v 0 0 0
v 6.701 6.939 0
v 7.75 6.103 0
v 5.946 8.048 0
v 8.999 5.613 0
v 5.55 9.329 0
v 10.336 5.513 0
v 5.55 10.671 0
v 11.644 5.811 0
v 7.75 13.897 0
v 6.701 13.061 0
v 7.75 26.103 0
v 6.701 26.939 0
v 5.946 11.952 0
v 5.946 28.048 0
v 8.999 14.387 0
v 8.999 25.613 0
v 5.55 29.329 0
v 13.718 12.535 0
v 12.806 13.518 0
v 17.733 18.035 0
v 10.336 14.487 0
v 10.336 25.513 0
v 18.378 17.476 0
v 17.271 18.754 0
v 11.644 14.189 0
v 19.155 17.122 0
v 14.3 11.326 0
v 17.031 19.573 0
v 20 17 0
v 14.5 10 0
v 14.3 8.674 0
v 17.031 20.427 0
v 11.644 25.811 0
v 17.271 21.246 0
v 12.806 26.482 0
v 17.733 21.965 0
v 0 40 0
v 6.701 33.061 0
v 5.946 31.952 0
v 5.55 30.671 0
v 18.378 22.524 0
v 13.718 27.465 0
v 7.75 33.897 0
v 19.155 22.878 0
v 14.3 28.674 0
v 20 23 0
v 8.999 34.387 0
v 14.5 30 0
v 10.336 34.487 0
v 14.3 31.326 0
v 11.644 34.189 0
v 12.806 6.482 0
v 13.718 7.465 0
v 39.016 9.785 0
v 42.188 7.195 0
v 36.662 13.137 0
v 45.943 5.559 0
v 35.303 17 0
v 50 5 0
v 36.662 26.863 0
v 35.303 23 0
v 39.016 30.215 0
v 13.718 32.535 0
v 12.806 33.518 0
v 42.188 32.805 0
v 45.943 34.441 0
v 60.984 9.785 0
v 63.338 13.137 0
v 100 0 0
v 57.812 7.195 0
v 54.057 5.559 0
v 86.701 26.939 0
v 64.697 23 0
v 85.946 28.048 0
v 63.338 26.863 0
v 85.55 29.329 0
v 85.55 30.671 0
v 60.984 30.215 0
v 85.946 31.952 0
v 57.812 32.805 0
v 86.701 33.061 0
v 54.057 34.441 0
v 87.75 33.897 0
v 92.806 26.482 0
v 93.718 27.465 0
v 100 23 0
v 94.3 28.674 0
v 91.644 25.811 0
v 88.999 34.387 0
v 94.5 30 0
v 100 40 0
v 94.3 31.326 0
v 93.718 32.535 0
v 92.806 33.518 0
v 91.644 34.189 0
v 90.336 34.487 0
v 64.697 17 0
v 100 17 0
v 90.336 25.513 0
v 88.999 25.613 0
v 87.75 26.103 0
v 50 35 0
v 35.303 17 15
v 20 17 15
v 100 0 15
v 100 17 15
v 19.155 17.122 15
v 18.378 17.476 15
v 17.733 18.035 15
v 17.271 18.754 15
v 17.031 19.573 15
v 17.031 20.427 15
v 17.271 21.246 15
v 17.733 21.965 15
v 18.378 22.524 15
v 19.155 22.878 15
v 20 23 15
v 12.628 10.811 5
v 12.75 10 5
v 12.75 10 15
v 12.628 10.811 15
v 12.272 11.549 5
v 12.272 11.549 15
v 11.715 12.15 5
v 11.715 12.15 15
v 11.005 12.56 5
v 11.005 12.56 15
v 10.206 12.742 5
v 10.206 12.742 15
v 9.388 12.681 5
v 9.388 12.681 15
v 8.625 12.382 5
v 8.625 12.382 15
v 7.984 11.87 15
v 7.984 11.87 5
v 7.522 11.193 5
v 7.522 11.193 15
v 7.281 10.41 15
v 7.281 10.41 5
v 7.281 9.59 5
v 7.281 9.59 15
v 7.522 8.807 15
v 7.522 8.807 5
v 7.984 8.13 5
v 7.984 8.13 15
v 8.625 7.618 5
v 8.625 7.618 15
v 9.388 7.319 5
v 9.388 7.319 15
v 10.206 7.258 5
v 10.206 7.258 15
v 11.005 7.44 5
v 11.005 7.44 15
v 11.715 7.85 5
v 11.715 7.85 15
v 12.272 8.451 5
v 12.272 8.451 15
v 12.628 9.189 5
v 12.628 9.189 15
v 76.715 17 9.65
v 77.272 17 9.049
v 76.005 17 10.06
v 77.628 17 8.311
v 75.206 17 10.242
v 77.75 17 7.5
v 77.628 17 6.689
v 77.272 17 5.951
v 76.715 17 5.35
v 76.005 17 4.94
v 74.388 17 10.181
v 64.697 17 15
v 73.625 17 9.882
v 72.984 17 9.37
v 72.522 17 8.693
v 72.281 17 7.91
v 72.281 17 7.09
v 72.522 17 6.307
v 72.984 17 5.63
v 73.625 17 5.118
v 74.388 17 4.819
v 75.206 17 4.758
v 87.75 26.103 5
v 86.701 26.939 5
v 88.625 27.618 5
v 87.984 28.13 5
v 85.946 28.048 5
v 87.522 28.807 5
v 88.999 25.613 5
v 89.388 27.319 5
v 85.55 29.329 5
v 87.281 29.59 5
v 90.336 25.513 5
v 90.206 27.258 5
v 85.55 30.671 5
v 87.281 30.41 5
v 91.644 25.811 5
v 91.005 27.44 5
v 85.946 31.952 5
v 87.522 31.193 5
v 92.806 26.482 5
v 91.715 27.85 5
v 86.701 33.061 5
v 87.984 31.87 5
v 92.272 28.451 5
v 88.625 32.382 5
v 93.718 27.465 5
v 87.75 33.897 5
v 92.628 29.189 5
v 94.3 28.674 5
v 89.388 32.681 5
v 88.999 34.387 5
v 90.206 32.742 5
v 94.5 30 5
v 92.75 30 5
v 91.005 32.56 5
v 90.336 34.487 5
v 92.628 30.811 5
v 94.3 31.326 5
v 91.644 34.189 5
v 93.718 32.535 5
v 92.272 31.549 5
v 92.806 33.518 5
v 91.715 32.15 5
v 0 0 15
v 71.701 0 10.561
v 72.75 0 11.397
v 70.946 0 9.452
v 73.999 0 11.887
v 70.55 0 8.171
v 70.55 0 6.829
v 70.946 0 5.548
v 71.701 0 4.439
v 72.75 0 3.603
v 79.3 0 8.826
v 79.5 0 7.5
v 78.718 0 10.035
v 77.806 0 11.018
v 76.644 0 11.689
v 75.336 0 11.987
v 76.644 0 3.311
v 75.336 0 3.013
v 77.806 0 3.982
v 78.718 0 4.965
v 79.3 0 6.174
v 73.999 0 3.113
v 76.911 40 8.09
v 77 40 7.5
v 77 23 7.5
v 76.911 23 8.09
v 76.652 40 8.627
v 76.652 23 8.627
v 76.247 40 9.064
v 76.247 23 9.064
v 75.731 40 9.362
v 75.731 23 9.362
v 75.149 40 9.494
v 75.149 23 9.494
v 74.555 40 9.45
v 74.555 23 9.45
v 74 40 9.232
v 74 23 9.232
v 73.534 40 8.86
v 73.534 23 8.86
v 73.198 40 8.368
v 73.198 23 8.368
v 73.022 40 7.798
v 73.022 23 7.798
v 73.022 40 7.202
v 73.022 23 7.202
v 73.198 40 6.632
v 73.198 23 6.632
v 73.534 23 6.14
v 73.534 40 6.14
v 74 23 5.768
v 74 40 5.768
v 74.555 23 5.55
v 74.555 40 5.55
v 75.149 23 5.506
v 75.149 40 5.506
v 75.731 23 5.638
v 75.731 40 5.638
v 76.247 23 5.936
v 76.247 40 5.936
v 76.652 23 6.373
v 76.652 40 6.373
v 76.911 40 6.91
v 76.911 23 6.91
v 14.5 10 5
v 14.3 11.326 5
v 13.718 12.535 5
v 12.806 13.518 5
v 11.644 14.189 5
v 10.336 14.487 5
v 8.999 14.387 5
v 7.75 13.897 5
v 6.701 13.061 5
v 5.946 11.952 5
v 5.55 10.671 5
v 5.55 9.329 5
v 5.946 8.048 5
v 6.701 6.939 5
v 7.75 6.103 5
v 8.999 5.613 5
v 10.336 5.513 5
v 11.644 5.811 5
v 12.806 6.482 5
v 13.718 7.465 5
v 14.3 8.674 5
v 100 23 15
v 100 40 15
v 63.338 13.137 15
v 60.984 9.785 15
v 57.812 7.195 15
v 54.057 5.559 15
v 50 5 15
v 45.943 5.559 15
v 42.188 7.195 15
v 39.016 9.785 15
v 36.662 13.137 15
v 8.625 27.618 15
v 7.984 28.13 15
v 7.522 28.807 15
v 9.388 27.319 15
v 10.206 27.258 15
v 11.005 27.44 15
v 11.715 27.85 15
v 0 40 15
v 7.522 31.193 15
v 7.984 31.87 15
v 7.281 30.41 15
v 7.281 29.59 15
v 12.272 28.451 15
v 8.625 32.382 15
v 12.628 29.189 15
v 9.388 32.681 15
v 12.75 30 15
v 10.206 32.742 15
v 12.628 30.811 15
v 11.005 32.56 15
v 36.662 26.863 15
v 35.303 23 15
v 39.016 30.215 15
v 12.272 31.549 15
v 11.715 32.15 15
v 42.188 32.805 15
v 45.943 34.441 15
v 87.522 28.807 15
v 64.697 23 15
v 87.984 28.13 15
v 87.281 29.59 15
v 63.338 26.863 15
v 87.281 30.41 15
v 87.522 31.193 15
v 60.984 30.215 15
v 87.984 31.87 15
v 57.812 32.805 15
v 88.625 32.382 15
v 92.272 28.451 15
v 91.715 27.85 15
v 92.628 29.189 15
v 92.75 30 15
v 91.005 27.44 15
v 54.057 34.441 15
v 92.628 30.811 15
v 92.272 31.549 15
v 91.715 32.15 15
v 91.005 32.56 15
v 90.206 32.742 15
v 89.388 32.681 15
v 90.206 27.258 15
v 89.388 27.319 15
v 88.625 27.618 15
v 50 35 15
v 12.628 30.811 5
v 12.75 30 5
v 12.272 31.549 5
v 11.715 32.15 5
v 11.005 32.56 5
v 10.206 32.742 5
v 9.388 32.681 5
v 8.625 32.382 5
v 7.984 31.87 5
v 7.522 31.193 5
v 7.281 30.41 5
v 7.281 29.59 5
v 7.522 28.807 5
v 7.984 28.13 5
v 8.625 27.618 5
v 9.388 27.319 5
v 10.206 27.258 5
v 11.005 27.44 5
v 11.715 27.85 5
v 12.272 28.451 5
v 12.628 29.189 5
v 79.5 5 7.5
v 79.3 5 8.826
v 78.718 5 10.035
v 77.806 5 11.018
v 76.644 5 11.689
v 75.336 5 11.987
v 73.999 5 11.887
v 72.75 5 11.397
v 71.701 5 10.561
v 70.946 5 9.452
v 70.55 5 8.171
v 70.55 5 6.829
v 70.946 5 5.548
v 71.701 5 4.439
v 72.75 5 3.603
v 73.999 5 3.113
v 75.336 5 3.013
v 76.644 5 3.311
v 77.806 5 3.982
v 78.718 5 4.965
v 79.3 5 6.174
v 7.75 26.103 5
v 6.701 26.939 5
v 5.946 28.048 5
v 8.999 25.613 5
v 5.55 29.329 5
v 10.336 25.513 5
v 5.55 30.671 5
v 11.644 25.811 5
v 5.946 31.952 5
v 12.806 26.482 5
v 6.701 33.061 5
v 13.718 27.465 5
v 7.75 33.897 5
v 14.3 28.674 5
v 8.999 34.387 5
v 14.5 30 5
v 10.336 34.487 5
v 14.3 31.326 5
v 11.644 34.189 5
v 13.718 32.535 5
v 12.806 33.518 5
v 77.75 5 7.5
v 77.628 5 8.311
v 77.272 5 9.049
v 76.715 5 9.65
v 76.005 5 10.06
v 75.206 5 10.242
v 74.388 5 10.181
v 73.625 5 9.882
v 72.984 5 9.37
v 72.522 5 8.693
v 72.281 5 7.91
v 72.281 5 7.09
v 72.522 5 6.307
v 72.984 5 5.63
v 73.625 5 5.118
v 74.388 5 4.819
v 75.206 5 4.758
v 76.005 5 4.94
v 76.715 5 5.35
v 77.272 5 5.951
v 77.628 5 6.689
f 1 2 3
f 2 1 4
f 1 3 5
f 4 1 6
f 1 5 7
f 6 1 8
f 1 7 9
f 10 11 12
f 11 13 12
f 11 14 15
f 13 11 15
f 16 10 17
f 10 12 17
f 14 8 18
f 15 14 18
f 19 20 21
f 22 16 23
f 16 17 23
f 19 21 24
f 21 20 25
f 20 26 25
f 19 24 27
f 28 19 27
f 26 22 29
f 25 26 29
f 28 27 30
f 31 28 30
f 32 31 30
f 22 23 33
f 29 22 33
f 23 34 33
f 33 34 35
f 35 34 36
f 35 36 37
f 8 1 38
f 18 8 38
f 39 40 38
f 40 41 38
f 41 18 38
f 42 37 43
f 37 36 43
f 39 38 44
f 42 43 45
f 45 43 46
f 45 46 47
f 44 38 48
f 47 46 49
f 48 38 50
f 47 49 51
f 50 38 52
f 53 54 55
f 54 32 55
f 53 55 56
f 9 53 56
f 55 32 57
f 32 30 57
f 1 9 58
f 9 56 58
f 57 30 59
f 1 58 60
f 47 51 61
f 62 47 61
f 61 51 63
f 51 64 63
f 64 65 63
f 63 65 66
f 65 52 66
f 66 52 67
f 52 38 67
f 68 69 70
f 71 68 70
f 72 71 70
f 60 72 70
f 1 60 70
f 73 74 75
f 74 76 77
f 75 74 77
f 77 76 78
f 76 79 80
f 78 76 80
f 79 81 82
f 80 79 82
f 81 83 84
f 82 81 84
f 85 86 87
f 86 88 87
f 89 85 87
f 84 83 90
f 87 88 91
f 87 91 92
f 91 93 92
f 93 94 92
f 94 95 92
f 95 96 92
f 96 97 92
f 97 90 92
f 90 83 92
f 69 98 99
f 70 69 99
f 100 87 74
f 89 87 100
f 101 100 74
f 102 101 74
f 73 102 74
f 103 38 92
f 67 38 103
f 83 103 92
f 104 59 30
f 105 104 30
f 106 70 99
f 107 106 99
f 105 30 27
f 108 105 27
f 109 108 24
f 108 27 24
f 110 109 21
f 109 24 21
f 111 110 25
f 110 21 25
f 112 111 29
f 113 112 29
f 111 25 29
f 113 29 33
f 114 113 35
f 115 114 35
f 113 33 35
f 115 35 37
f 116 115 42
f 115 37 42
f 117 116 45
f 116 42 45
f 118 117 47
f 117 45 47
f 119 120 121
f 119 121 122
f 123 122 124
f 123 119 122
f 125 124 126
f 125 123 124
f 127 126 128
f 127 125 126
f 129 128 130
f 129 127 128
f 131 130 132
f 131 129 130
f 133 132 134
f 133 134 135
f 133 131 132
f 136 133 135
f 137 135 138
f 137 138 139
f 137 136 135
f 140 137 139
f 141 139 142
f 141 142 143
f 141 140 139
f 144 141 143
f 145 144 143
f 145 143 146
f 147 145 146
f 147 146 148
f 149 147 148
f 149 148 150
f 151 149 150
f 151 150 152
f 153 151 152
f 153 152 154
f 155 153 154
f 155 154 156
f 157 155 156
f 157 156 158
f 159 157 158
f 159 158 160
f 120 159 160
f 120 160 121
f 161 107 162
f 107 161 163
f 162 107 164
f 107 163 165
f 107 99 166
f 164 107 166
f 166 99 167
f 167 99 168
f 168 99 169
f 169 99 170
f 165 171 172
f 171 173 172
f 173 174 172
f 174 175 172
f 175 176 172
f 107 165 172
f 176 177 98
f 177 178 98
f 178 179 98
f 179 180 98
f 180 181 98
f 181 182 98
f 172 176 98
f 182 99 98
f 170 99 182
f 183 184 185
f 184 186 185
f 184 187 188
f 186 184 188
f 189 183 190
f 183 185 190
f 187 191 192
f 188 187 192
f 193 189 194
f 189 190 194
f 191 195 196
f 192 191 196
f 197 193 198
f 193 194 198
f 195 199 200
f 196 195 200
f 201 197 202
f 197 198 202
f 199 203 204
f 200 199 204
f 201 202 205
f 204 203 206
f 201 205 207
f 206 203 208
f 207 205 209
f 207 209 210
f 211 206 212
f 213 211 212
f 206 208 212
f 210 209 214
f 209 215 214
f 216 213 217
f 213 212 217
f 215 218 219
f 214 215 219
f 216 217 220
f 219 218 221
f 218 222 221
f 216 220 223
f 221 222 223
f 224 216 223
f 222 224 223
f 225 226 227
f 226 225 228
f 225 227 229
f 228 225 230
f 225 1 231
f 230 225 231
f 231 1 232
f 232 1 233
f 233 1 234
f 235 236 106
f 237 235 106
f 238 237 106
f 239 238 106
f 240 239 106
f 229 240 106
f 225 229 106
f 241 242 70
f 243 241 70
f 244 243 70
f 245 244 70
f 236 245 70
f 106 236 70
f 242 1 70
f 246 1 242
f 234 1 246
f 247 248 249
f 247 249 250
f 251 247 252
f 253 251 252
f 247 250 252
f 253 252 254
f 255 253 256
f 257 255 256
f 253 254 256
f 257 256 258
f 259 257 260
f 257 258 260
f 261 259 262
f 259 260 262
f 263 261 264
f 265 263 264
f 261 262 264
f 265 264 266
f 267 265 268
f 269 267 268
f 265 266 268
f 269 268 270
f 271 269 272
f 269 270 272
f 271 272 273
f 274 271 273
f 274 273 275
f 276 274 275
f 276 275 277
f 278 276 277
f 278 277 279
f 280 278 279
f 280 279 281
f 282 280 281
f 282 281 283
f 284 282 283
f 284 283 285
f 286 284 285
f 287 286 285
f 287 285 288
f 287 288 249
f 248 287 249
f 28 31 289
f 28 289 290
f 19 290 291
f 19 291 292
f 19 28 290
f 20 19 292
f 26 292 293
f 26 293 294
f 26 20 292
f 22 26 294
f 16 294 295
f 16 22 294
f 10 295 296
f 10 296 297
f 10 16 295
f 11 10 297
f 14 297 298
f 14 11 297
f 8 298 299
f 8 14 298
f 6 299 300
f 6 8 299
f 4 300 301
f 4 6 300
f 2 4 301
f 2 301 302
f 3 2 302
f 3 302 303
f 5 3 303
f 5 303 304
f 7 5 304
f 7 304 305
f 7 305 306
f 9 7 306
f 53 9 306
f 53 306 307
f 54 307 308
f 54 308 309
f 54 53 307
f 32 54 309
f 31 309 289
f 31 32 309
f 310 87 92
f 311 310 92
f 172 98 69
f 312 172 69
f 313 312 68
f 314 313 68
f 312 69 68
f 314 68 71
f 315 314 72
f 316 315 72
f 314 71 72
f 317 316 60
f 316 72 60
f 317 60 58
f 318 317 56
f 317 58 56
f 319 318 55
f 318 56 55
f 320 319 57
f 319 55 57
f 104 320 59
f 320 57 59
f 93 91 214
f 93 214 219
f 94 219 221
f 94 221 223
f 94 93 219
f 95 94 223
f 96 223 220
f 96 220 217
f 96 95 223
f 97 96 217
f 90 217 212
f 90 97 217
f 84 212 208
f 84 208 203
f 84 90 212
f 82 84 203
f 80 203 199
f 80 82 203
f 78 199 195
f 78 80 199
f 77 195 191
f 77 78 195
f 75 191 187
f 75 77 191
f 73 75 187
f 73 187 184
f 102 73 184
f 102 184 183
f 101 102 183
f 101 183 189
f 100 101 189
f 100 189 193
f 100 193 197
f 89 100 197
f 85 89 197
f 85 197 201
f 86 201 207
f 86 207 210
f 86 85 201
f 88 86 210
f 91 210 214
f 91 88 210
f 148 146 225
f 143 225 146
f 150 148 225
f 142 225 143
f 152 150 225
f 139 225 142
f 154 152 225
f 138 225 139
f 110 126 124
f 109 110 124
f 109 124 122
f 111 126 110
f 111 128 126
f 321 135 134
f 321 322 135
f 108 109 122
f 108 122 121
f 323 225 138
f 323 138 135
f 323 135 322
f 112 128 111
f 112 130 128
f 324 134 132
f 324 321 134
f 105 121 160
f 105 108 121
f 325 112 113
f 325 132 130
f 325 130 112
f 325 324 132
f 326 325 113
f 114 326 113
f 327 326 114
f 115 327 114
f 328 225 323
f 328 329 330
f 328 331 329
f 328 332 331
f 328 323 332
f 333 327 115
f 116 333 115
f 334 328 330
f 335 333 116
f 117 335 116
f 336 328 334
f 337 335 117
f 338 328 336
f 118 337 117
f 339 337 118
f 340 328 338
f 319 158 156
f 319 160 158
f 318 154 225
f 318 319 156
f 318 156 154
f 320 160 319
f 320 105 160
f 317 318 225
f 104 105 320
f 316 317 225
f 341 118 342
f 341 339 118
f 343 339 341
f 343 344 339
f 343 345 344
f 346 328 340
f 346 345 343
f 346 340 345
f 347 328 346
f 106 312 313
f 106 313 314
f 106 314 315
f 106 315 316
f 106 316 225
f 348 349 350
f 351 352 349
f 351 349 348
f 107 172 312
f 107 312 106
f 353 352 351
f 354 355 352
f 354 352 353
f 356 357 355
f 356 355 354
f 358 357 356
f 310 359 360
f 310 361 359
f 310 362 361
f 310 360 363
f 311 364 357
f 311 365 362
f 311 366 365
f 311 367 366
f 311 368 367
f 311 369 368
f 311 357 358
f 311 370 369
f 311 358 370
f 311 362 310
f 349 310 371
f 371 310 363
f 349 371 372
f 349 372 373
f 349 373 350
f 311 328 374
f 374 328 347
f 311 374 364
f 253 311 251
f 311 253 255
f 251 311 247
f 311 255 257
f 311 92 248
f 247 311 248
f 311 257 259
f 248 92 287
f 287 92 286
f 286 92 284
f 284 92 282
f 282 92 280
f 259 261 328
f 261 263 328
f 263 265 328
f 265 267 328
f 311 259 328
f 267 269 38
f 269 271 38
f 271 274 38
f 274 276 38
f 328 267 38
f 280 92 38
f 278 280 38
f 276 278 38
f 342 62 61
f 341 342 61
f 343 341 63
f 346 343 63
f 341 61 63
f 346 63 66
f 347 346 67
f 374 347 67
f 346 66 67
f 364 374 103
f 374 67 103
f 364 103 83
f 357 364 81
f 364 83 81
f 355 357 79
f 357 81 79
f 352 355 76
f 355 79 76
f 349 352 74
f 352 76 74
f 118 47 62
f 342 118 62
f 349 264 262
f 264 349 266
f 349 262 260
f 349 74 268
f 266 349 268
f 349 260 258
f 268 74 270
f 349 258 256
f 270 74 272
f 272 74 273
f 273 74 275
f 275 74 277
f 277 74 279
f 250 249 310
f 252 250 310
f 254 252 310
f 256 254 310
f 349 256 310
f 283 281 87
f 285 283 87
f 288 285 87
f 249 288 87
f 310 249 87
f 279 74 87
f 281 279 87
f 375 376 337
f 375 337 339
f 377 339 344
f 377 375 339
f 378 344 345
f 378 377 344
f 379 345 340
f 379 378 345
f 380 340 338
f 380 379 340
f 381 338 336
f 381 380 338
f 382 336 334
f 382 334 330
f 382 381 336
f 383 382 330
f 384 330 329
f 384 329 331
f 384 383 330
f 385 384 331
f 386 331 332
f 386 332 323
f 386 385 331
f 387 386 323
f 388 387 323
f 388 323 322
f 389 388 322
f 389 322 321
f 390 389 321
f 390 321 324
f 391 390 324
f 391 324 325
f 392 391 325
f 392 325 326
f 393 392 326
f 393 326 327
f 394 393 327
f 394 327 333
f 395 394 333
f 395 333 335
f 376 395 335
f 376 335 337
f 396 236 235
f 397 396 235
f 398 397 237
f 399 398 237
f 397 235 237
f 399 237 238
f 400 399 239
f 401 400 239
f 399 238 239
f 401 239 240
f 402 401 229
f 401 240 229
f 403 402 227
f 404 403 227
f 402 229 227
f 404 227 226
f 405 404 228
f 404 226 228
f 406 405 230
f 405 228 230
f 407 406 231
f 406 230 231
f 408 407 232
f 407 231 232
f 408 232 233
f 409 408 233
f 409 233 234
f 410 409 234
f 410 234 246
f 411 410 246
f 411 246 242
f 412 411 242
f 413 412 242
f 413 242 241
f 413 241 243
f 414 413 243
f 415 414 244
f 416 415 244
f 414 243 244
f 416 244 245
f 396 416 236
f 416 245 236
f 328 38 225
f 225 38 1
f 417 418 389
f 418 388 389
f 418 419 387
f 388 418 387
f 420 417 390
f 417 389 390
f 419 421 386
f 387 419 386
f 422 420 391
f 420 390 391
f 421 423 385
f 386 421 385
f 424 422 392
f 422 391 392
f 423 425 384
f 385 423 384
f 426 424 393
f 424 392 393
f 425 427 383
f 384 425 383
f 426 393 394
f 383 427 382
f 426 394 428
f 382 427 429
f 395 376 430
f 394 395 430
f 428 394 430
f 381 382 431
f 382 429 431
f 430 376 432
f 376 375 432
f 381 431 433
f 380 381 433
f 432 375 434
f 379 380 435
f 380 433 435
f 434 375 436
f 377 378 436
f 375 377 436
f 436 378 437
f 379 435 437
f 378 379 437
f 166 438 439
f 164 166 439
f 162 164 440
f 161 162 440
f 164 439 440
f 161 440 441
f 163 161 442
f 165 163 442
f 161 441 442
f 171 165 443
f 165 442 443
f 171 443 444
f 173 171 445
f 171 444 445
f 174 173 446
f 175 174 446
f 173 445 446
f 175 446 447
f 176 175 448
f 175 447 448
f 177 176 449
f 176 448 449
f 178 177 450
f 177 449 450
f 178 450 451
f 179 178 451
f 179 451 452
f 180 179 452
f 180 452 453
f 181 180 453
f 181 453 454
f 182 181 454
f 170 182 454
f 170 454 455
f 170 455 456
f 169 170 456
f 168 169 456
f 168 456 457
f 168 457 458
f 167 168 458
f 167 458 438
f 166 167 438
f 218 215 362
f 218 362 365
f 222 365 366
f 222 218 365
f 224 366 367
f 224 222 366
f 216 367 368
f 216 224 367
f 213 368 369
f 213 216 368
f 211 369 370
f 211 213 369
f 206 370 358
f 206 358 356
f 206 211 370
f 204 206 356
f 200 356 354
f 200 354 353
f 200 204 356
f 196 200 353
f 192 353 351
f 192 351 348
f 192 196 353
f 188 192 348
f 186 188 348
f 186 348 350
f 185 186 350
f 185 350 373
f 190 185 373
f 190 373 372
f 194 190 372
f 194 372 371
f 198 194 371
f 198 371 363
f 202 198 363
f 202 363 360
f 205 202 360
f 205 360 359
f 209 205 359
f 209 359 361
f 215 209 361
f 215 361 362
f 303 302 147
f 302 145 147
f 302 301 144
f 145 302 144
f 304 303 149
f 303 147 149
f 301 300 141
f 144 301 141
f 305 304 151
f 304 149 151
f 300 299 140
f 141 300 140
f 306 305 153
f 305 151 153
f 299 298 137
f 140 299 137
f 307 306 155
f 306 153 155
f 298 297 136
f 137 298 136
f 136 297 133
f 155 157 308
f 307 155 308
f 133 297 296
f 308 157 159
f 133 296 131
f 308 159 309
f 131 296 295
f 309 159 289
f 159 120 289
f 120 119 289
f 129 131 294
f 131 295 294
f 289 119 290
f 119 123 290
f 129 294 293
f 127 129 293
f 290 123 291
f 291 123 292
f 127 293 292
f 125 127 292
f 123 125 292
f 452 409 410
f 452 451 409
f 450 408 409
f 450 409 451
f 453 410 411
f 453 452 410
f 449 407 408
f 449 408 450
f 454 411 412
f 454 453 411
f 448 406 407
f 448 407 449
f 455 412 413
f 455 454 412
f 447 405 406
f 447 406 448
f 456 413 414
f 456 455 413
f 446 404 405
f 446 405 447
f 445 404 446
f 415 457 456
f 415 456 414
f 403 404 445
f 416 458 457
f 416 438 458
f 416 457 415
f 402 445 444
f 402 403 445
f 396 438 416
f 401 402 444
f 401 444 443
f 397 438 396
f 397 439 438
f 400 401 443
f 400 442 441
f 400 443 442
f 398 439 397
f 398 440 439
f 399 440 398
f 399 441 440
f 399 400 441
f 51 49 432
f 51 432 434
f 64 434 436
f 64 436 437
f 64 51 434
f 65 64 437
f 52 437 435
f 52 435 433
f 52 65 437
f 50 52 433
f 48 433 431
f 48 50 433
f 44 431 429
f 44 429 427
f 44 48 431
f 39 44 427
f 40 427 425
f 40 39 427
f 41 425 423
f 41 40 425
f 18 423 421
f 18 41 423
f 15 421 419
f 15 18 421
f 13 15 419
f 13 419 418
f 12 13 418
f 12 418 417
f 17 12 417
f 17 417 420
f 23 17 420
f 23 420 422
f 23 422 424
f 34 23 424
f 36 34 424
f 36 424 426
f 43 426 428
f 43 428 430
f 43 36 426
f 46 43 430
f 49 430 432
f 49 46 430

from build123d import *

# Parameters (mm, degrees)
SKETCH1_R           = 2.75
BOSS_EXTRUDE1_DEPTH = 15
SKETCH2_R           = 2
CUT_EXTRUDE1_DEPTH  = 41
SKETCH3_R           = 4.5
CUT_EXTRUDE2_DEPTH  = 5
SKETCH4_R           = 4.5
CUT_EXTRUDE3_DEPTH  = 5
CUT_EXTRUDE4_REACH  = 37
SKETCH5_R           = 2.75


with BuildPart() as part:
    # Sketch1 → Boss-Extrude1 (new body)
    with BuildSketch(Plane.XY):
        with BuildLine():
            Line((0, 0), (100, 0))
            Line((100, 0), (100, 17))
            Line((100, 17), (64.696938457, 17))
            ThreePointArc((64.696938457, 17), (50, 5), (35.303061543, 17))
            Line((35.303061543, 17), (20, 17))
            ThreePointArc((20, 17), (17, 20), (20, 23))
            Line((20, 23), (35.303061543, 23))
            ThreePointArc((35.303061543, 23), (50, 35), (64.696938457, 23))
            Line((64.696938457, 23), (100, 23))
            Line((100, 23), (100, 40))
            Line((100, 40), (0, 40))
            Line((0, 40), (0, 0))
        make_face()
        with Locations((10, 30)):
            Circle(SKETCH1_R, mode=Mode.SUBTRACT)
        with Locations((10, 10)):
            Circle(SKETCH1_R, mode=Mode.SUBTRACT)
        with Locations((90, 30)):
            Circle(SKETCH1_R, mode=Mode.SUBTRACT)
    extrude(amount=BOSS_EXTRUDE1_DEPTH)

    # Sketch2 → Cut-Extrude1 (cut, through all)
    with BuildSketch(Plane.XZ):
        with Locations((75, 7.5)):
            Circle(SKETCH2_R)
    extrude(amount=-CUT_EXTRUDE1_DEPTH, mode=Mode.SUBTRACT)

    # Sketch3 → Cut-Extrude2 (cut)
    with BuildSketch(Plane.XZ):
        with Locations((75, 7.5)):
            Circle(SKETCH3_R)
    extrude(amount=-CUT_EXTRUDE2_DEPTH, mode=Mode.SUBTRACT)

    # Sketch4 → Cut-Extrude3 (cut)
    with BuildSketch(Plane.XY):
        with Locations((10, 10)):
            Circle(SKETCH4_R)
        with Locations((10, 30)):
            Circle(SKETCH4_R)
        with Locations((90, 30)):
            Circle(SKETCH4_R)
    extrude(amount=CUT_EXTRUDE3_DEPTH, mode=Mode.SUBTRACT)

    # Sketch5 → Cut-Extrude4 (cut, up to next)
    with BuildSketch(Plane.XZ.offset(-5), mode=Mode.PRIVATE) as cut_extrude4_sk1:
        with Locations((75, 7.5)):
            Circle(SKETCH5_R)
    cut_extrude4_tool1 = extrude(cut_extrude4_sk1.sketch, amount=-CUT_EXTRUDE4_REACH, mode=Mode.PRIVATE) & part.part
    add(cut_extrude4_tool1.solids().sort_by_distance((75, 5, 7.5))[0], mode=Mode.SUBTRACT)


solid = part.part
